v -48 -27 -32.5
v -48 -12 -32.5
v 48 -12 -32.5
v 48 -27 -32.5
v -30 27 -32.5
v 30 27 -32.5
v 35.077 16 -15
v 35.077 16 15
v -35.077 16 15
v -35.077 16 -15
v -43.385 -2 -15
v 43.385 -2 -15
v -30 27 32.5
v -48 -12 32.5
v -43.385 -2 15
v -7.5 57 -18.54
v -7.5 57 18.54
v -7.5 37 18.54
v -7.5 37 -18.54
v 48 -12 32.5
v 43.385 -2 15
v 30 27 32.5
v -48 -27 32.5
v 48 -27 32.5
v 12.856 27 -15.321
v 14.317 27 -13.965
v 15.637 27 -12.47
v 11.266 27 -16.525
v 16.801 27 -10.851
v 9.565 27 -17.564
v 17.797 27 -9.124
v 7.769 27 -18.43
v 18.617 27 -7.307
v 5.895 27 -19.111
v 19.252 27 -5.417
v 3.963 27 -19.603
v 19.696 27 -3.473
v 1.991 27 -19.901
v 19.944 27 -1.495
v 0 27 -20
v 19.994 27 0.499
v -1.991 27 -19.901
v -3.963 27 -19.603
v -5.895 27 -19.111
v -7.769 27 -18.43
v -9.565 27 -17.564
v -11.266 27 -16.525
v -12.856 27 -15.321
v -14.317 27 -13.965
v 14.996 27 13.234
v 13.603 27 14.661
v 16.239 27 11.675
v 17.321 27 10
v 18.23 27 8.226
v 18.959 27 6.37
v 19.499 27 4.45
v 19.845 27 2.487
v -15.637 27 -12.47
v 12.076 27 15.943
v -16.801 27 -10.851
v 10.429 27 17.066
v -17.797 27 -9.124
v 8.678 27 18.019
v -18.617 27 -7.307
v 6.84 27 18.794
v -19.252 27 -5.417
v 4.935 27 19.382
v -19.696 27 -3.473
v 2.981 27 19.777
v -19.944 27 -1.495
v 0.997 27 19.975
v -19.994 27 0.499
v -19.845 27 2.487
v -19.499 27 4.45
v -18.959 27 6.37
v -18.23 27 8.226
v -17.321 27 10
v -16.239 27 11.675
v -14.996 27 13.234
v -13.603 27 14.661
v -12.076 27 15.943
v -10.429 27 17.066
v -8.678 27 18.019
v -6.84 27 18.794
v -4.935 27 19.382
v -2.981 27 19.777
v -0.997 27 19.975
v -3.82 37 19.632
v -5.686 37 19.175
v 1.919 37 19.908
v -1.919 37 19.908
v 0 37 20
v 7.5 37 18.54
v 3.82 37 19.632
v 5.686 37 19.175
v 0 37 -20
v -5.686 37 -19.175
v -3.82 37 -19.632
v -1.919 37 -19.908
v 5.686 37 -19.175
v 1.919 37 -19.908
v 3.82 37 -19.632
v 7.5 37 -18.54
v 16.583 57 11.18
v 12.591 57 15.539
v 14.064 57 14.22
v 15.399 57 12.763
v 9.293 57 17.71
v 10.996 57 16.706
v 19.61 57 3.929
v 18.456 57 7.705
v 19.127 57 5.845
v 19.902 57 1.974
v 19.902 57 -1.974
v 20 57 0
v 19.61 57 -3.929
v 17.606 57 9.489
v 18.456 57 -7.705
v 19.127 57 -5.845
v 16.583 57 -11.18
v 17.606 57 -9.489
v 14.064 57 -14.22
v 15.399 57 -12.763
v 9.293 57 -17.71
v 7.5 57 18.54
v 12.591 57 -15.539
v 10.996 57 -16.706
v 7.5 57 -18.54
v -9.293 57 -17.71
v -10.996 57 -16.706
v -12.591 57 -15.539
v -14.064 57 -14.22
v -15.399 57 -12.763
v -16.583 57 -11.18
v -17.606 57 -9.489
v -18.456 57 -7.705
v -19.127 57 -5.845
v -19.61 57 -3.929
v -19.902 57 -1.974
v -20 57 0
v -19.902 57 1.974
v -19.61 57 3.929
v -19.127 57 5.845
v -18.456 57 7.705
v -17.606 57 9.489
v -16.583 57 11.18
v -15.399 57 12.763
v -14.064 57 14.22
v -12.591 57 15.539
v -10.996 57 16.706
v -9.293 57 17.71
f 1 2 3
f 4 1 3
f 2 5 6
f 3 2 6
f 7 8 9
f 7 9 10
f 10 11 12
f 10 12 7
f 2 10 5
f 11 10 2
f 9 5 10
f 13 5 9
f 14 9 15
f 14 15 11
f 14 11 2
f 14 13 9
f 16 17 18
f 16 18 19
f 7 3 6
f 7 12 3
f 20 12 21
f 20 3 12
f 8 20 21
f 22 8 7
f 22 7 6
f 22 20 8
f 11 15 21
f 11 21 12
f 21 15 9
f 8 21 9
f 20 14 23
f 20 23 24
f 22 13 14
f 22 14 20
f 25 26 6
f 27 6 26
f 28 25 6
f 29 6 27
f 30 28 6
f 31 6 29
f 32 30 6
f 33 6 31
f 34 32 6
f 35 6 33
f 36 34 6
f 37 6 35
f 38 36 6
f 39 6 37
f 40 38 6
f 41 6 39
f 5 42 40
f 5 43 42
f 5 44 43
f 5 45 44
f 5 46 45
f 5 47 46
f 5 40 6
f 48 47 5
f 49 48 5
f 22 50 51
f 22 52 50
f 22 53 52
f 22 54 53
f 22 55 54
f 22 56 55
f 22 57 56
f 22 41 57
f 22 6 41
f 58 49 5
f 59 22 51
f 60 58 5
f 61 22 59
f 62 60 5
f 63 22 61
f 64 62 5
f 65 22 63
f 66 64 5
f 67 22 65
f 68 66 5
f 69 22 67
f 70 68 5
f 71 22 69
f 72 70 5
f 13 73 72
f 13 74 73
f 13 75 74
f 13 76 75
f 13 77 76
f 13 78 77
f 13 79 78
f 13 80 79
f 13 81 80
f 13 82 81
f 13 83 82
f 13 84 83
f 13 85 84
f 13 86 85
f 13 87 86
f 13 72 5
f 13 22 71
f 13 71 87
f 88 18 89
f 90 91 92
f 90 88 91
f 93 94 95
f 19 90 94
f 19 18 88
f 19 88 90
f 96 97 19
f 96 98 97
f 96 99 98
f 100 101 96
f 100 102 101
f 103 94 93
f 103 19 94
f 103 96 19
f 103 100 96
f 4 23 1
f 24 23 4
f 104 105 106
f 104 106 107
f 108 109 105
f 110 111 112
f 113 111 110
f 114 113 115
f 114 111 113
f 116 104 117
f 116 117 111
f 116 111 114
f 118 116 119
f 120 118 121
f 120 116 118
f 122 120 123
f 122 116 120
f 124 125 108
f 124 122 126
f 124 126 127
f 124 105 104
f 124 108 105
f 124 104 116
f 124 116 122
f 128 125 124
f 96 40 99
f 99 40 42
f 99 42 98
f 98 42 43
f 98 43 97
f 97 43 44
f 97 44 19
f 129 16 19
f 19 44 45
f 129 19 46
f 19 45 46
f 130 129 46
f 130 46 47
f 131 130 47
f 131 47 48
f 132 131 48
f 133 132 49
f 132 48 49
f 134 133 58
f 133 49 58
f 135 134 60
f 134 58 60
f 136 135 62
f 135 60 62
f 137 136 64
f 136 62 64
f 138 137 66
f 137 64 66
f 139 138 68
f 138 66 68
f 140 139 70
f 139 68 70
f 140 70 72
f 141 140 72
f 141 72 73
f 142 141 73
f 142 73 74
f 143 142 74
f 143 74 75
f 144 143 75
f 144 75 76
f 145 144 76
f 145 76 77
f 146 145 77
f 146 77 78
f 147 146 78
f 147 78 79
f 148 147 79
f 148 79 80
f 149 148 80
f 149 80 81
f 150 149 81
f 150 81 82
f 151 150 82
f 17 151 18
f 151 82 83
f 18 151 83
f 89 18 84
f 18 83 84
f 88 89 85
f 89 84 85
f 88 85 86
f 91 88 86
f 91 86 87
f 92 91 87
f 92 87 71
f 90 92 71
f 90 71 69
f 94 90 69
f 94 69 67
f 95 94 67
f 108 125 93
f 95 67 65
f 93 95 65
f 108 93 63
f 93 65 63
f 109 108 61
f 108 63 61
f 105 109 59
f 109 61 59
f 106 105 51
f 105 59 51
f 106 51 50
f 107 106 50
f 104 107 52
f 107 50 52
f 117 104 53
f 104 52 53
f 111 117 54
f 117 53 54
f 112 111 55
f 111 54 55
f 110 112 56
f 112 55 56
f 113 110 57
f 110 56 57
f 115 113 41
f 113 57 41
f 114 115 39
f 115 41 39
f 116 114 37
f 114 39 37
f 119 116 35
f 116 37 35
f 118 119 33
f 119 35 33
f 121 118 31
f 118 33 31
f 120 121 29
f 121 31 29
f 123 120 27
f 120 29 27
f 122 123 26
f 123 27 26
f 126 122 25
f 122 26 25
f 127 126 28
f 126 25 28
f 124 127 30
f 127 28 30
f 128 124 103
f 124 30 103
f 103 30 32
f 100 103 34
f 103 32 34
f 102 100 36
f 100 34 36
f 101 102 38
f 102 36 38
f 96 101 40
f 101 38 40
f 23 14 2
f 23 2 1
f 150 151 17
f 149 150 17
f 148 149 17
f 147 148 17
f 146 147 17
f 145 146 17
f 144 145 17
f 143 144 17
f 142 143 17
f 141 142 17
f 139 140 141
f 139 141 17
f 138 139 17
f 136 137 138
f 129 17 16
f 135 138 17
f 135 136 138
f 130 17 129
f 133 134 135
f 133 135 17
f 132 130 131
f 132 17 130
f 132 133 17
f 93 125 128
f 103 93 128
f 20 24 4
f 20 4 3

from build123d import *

# Parameters (mm, degrees)
EXTRUDE_2_DEPTH          = 32.5
CUT_EXTRUDE_1_DEPTH      = 64.947243881
CUT_EXTRUDE_1_DEPTH_BACK = 64.947243881
SKETCH_2_W               = 30
SKETCH_2_H               = 18
SKETCH_3_R               = 20
EXTRUDE_3_DEPTH          = 30
SKETCH_4_W               = 15
SKETCH_4_H               = 65
CUT_EXTRUDE_2_DEPTH      = 20


with BuildPart() as part:
    # Эскиз1 → Бобышка-Вытянуть2 (new, symmetric)
    with BuildSketch(Plane.XY):
        Polygon((-30, 27), (-48, -12), (-48, -27), (48, -27), (48, -12), (30, 27), align=None)
    extrude(amount=EXTRUDE_2_DEPTH, both=True)

    # Эскиз2 → Вырез-Вытянуть1 (cut, two sides: drawn at the far end of the back side and taken through both)
    with BuildSketch(Plane(origin=(0, 0, 0), x_dir=(0, 0, -1), z_dir=(1, 0, 0)).offset(-CUT_EXTRUDE_1_DEPTH_BACK)):
        with Locations((0, 7)):
            Rectangle(SKETCH_2_W, SKETCH_2_H)
    extrude(amount=CUT_EXTRUDE_1_DEPTH + CUT_EXTRUDE_1_DEPTH_BACK, mode=Mode.SUBTRACT)

    # Эскиз3 → Бобышка-Вытянуть3 (add)
    with BuildSketch(Plane(origin=(0, 27, 0), x_dir=(1, 0, 0), z_dir=(0, 1, 0))):
        with Locations(Location((0, 0, 0), (0, 0, 90))):
            Circle(SKETCH_3_R)
    extrude(amount=EXTRUDE_3_DEPTH)

    # Эскиз4 → Вырез-Вытянуть2 (cut)
    with BuildSketch(Plane(origin=(0, 57, 0), x_dir=(1, 0, 0), z_dir=(0, 1, 0))):
        Rectangle(SKETCH_4_W, SKETCH_4_H)
    extrude(amount=-CUT_EXTRUDE_2_DEPTH, mode=Mode.SUBTRACT)


solid = part.part
